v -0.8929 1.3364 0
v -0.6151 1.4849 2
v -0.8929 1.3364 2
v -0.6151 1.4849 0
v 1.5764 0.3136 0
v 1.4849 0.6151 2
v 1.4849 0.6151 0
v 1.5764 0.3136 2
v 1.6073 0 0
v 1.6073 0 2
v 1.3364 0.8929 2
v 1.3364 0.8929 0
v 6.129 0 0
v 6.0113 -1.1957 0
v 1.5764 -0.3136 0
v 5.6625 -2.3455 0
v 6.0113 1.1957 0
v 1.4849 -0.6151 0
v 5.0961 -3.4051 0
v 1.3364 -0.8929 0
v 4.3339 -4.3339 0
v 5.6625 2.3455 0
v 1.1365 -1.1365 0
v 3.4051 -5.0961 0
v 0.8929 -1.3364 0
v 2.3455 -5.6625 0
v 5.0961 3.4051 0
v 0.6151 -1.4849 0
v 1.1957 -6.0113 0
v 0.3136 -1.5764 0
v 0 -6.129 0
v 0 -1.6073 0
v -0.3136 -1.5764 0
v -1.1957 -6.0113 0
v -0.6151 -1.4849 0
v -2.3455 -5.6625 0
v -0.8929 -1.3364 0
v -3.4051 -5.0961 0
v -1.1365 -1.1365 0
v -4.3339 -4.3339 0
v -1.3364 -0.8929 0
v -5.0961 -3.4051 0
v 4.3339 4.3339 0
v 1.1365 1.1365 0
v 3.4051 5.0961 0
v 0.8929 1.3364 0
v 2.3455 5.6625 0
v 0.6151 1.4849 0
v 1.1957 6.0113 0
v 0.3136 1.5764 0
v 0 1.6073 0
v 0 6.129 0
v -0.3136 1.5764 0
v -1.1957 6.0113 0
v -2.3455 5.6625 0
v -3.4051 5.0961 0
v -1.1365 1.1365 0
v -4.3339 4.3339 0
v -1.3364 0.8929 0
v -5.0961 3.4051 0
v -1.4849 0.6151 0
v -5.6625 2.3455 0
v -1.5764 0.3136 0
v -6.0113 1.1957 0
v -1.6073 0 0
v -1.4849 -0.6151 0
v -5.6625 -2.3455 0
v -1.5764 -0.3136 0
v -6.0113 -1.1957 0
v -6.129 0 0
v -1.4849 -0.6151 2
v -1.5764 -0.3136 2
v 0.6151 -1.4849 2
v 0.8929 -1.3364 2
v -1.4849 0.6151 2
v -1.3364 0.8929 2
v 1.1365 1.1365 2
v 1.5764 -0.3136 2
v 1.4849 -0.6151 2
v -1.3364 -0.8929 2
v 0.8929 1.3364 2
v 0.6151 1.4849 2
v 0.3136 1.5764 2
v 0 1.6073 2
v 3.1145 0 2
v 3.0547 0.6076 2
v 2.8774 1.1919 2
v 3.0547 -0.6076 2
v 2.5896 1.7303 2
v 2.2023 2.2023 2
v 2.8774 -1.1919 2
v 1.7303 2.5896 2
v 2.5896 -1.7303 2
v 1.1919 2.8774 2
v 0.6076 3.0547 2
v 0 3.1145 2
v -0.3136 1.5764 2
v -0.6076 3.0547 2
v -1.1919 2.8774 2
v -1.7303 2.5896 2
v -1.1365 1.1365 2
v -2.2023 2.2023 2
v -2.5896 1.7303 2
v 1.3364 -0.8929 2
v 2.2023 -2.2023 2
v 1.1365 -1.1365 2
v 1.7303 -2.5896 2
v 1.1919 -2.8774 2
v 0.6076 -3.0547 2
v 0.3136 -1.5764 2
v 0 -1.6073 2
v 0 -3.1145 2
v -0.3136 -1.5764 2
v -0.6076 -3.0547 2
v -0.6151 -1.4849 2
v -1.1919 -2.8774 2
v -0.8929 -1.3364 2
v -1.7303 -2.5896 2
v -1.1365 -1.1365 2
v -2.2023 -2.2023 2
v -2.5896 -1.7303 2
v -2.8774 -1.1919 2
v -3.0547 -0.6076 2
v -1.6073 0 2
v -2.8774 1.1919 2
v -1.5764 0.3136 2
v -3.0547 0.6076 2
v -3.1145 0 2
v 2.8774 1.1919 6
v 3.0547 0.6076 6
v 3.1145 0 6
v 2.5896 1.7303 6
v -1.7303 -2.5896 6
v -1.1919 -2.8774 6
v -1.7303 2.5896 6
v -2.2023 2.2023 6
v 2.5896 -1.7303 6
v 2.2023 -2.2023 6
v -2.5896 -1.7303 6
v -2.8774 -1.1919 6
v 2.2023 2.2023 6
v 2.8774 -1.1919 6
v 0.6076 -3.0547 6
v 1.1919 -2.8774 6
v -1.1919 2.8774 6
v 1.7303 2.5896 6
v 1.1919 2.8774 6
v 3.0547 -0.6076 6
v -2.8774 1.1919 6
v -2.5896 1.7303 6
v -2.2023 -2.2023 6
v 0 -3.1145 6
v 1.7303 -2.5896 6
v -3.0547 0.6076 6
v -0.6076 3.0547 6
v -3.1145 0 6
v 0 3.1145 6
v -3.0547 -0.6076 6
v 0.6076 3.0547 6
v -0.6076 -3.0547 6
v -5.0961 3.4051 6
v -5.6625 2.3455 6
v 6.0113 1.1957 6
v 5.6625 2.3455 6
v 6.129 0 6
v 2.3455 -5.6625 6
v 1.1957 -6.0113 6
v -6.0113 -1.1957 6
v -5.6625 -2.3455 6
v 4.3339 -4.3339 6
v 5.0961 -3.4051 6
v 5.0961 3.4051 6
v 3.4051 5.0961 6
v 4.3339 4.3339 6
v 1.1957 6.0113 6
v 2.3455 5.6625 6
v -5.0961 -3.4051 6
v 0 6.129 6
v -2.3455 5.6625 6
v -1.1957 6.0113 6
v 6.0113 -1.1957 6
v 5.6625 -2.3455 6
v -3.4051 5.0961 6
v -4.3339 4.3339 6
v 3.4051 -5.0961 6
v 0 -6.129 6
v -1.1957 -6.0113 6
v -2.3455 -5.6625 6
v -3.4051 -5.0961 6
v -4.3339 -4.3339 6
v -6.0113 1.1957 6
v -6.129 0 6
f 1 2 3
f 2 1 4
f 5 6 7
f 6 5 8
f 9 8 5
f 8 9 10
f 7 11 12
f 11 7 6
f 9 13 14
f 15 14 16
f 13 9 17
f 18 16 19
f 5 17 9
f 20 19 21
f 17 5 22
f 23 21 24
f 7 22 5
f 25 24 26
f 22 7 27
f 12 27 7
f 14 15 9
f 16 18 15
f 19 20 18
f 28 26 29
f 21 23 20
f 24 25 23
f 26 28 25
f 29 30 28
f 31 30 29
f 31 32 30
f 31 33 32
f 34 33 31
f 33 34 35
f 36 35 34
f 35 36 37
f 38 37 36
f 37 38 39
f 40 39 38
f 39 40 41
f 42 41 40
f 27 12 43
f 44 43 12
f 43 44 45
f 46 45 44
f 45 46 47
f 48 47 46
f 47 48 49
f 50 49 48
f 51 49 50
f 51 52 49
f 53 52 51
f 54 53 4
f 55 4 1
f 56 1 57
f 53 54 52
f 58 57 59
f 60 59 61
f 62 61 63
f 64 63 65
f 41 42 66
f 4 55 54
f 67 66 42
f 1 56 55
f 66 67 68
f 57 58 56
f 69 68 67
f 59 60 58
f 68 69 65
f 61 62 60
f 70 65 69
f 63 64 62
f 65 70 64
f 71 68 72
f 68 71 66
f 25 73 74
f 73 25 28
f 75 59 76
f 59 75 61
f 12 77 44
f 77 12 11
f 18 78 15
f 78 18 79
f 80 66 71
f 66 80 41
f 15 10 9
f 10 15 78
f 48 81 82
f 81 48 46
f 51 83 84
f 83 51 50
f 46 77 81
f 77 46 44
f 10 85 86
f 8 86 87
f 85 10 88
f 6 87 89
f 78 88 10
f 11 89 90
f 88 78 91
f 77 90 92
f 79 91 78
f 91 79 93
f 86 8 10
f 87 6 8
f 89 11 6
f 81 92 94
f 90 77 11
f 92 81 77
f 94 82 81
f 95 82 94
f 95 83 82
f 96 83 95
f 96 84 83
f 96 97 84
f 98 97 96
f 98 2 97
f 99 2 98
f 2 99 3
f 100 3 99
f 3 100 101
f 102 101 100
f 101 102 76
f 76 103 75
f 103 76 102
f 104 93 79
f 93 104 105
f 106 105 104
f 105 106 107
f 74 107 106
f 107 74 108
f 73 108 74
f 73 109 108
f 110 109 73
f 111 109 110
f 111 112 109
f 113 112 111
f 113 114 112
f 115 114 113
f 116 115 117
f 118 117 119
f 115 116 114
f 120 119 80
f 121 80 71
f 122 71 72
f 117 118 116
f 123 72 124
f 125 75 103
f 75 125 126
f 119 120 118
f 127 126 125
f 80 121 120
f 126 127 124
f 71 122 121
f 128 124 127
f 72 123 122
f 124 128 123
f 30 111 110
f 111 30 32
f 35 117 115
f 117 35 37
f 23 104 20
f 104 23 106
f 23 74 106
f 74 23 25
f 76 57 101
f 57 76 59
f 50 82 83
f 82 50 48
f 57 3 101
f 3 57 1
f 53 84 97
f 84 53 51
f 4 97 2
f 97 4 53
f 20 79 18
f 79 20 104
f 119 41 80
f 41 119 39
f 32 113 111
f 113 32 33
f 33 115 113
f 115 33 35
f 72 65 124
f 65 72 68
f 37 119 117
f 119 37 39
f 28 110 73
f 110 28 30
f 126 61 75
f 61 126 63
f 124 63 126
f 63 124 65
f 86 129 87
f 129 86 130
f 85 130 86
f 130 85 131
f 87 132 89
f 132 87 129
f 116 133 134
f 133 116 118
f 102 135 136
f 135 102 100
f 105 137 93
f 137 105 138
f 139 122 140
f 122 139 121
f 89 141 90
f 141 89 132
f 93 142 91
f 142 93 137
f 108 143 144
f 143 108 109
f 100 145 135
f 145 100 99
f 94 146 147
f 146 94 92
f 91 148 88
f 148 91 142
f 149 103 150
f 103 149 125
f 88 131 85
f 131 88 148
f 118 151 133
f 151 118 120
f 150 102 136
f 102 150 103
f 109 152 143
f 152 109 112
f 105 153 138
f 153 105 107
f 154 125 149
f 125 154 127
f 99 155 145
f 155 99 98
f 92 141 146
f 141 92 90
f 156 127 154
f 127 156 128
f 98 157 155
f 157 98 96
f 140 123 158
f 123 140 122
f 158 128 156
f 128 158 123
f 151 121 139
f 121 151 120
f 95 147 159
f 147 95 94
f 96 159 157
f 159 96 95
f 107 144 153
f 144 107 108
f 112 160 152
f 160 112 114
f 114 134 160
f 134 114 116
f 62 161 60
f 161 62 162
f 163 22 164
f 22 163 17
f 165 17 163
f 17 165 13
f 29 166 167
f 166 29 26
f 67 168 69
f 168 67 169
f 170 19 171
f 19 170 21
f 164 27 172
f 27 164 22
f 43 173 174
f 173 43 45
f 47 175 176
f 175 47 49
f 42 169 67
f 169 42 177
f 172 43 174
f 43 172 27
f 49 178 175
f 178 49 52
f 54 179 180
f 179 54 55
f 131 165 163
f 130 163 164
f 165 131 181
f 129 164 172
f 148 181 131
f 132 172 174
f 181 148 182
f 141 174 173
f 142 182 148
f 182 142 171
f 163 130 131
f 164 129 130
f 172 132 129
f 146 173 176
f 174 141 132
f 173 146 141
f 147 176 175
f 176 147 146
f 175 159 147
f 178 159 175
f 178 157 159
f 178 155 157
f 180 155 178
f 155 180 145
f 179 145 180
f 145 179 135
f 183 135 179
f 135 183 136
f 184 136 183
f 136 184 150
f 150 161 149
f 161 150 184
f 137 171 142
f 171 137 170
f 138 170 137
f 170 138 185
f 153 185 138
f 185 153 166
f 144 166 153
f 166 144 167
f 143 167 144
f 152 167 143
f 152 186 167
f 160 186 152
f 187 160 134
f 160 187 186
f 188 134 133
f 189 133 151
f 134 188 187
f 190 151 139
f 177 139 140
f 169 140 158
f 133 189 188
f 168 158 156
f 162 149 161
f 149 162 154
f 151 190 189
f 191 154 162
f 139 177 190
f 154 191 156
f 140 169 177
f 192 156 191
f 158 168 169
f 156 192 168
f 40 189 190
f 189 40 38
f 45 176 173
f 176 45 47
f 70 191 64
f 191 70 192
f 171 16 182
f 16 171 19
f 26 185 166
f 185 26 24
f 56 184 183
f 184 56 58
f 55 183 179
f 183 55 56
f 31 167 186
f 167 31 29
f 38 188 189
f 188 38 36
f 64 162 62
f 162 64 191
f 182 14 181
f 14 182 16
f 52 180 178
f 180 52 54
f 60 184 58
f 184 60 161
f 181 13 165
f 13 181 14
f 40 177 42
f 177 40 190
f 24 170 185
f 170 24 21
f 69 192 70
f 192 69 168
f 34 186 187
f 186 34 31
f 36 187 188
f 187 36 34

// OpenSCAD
// file: bolts.scad
$radial_error = 0.1;

$fn = $preview ? 12 : 32;

ISO262_COARSE_PITCH = [
	[1.0, 0.25],
	[1.2, 0.25],
	[1.4, 0.2],
	[1.6, 0.35],
	[1.8, 0.2],
	[2.0, 0.4],
	[2.5, 0.45],
	[3.0, 0.5],
	[3.5, 0.35],
	[4.0, 0.7],
	[5.0, 0.8],
	[6.0, 1.0],
	[7.0, 0.75],
	[8.0, 1.25],
	[10.0, 1.5],
	[12.0, 1.75],
	[14.0, 1.5],
	[16.0, 2.0],
	[30.0, 3.5],
	[42.0, 4.5],
	[56.0, 5.5]
];

function screw_pitch(d) = lookup(d, ISO262_COARSE_PITCH);

module cylinder_outer(height, radius, fn=$fn, radial_error=$radial_error) {
	fudge = 1/cos(180/fn);
	cylinder(h=height,r=radius*fudge+$radial_error, $fn=fn);
}

module cylinder_inner(height, radius, fn=$fn) {
	cylinder(h=height,r=radius-$radial_error,$fn=fn);
}

// Make a hole. The diameter is the size of the screw (e.g. 3 for M3). Depth is how far the hole should go for the thread, and inset is how far out there should be a hole for the head to go.
module hole(diameter=3, depth=6, inset=10, pitch=0) {
	cylinder_outer(depth, (diameter-pitch)/2);
	translate([0, 0, depth]) cylinder_outer(inset, diameter, 32);
}

module threaded_hole(diameter=3, depth=6, inset=10) {
	hole(diameter, depth, inset, screw_pitch(diameter));
}

module countersunk_hole(diameter=3, depth=6, inset=10, pitch=0) {
	hole(diameter, depth, inset, pitch);
	translate([0, 0, depth-diameter/2]) cylinder(r1=diameter/2+$radial_error, r2=diameter+$radial_error, h=diameter/2);
}

module knurled_insert(diameter = 3, depth = 6, thickness = 1) {
	cylinder_inner(depth, diameter/2 + thickness);
}

module knurled_hole(diameter = 3, depth = 6, inset = 10, insert = 4, thickness = 1) {
	hole(diameter, depth, inset);
	
	knurled_insert(diameter, insert, thickness);
}

module countersunk_knurled_hole(diameter = 3, depth = 6, inset = 10, insert = 4, thickness = 1) {
	countersunk_hole(diameter, depth, inset);
	
	knurled_insert(diameter, insert, thickness);
}

// Make a hole for a bolt/screw combination.
module bolted_hole(diameter=3, depth=8, nut_offset=2, shaft_length=10, inset=10) {
	hole(diameter, depth, inset);
	hull() {
		shaft_width = diameter;
		translate([0, 0, nut_offset]) rotate(360/12, [0, 0, 1]) cylinder_outer(diameter, shaft_width, 6);
		translate([0, shaft_length, nut_offset]) rotate(360/12, [0, 0, 1]) cylinder_outer(diameter, shaft_width, 6);
	}
}

module countersunk_bolted_hole(diameter=3, depth=8, nut_offset=2, shaft_length=10, inset=10) {
	countersunk_hole(diameter, depth, inset);
	hull() {
		shaft_width = diameter;
		translate([0, 0, nut_offset]) rotate(360/12, [0, 0, 1]) cylinder_outer(diameter, shaft_width, 6);
		translate([0, shaft_length, nut_offset]) rotate(360/12, [0, 0, 1]) cylinder_outer(diameter, shaft_width, 6);
	}
}

module mounting_hole(diameter=3, depth=6, inset=10, outset=3) {
	difference() {
		cylinder_outer(depth, diameter/2+outset);
		hole(diameter=diameter, depth=depth, inset=inset);
	}
}

render() rotate(90, [1, 0, 0]) difference() {
	cube([40, 10, 10]);
	translate([5, 5, 0]) bolted_hole(diameter=3, depth=8);
	translate([15, 5, 0]) bolted_hole(diameter=4, depth=8);
	translate([25, 5, 0]) countersunk_hole(diameter=4, depth=8);
	translate([35, 5, 0]) knurled_hole();
}

!render() rotate(90, [1, 0, 0]) difference() {
	cube([6*4, 12, 12]);
	translate([6, 6, 0]) hole(diameter=5, depth=8);
	translate([6*3, 6, 0]) hole(diameter=5.5, depth=8);
}
// main file
$tolerance = 0.1;
$fn = $preview ? 12 : 32;

use <bolts.scad>;

module spacer(diameter, thickness, height, rim = 1) {
	difference() {
		cylinder_outer(height, diameter * rim);
		
		hole(diameter, thickness);
	}
}

//spacer(3, 2, 2);

spacer(3, 2, 6, 2);
